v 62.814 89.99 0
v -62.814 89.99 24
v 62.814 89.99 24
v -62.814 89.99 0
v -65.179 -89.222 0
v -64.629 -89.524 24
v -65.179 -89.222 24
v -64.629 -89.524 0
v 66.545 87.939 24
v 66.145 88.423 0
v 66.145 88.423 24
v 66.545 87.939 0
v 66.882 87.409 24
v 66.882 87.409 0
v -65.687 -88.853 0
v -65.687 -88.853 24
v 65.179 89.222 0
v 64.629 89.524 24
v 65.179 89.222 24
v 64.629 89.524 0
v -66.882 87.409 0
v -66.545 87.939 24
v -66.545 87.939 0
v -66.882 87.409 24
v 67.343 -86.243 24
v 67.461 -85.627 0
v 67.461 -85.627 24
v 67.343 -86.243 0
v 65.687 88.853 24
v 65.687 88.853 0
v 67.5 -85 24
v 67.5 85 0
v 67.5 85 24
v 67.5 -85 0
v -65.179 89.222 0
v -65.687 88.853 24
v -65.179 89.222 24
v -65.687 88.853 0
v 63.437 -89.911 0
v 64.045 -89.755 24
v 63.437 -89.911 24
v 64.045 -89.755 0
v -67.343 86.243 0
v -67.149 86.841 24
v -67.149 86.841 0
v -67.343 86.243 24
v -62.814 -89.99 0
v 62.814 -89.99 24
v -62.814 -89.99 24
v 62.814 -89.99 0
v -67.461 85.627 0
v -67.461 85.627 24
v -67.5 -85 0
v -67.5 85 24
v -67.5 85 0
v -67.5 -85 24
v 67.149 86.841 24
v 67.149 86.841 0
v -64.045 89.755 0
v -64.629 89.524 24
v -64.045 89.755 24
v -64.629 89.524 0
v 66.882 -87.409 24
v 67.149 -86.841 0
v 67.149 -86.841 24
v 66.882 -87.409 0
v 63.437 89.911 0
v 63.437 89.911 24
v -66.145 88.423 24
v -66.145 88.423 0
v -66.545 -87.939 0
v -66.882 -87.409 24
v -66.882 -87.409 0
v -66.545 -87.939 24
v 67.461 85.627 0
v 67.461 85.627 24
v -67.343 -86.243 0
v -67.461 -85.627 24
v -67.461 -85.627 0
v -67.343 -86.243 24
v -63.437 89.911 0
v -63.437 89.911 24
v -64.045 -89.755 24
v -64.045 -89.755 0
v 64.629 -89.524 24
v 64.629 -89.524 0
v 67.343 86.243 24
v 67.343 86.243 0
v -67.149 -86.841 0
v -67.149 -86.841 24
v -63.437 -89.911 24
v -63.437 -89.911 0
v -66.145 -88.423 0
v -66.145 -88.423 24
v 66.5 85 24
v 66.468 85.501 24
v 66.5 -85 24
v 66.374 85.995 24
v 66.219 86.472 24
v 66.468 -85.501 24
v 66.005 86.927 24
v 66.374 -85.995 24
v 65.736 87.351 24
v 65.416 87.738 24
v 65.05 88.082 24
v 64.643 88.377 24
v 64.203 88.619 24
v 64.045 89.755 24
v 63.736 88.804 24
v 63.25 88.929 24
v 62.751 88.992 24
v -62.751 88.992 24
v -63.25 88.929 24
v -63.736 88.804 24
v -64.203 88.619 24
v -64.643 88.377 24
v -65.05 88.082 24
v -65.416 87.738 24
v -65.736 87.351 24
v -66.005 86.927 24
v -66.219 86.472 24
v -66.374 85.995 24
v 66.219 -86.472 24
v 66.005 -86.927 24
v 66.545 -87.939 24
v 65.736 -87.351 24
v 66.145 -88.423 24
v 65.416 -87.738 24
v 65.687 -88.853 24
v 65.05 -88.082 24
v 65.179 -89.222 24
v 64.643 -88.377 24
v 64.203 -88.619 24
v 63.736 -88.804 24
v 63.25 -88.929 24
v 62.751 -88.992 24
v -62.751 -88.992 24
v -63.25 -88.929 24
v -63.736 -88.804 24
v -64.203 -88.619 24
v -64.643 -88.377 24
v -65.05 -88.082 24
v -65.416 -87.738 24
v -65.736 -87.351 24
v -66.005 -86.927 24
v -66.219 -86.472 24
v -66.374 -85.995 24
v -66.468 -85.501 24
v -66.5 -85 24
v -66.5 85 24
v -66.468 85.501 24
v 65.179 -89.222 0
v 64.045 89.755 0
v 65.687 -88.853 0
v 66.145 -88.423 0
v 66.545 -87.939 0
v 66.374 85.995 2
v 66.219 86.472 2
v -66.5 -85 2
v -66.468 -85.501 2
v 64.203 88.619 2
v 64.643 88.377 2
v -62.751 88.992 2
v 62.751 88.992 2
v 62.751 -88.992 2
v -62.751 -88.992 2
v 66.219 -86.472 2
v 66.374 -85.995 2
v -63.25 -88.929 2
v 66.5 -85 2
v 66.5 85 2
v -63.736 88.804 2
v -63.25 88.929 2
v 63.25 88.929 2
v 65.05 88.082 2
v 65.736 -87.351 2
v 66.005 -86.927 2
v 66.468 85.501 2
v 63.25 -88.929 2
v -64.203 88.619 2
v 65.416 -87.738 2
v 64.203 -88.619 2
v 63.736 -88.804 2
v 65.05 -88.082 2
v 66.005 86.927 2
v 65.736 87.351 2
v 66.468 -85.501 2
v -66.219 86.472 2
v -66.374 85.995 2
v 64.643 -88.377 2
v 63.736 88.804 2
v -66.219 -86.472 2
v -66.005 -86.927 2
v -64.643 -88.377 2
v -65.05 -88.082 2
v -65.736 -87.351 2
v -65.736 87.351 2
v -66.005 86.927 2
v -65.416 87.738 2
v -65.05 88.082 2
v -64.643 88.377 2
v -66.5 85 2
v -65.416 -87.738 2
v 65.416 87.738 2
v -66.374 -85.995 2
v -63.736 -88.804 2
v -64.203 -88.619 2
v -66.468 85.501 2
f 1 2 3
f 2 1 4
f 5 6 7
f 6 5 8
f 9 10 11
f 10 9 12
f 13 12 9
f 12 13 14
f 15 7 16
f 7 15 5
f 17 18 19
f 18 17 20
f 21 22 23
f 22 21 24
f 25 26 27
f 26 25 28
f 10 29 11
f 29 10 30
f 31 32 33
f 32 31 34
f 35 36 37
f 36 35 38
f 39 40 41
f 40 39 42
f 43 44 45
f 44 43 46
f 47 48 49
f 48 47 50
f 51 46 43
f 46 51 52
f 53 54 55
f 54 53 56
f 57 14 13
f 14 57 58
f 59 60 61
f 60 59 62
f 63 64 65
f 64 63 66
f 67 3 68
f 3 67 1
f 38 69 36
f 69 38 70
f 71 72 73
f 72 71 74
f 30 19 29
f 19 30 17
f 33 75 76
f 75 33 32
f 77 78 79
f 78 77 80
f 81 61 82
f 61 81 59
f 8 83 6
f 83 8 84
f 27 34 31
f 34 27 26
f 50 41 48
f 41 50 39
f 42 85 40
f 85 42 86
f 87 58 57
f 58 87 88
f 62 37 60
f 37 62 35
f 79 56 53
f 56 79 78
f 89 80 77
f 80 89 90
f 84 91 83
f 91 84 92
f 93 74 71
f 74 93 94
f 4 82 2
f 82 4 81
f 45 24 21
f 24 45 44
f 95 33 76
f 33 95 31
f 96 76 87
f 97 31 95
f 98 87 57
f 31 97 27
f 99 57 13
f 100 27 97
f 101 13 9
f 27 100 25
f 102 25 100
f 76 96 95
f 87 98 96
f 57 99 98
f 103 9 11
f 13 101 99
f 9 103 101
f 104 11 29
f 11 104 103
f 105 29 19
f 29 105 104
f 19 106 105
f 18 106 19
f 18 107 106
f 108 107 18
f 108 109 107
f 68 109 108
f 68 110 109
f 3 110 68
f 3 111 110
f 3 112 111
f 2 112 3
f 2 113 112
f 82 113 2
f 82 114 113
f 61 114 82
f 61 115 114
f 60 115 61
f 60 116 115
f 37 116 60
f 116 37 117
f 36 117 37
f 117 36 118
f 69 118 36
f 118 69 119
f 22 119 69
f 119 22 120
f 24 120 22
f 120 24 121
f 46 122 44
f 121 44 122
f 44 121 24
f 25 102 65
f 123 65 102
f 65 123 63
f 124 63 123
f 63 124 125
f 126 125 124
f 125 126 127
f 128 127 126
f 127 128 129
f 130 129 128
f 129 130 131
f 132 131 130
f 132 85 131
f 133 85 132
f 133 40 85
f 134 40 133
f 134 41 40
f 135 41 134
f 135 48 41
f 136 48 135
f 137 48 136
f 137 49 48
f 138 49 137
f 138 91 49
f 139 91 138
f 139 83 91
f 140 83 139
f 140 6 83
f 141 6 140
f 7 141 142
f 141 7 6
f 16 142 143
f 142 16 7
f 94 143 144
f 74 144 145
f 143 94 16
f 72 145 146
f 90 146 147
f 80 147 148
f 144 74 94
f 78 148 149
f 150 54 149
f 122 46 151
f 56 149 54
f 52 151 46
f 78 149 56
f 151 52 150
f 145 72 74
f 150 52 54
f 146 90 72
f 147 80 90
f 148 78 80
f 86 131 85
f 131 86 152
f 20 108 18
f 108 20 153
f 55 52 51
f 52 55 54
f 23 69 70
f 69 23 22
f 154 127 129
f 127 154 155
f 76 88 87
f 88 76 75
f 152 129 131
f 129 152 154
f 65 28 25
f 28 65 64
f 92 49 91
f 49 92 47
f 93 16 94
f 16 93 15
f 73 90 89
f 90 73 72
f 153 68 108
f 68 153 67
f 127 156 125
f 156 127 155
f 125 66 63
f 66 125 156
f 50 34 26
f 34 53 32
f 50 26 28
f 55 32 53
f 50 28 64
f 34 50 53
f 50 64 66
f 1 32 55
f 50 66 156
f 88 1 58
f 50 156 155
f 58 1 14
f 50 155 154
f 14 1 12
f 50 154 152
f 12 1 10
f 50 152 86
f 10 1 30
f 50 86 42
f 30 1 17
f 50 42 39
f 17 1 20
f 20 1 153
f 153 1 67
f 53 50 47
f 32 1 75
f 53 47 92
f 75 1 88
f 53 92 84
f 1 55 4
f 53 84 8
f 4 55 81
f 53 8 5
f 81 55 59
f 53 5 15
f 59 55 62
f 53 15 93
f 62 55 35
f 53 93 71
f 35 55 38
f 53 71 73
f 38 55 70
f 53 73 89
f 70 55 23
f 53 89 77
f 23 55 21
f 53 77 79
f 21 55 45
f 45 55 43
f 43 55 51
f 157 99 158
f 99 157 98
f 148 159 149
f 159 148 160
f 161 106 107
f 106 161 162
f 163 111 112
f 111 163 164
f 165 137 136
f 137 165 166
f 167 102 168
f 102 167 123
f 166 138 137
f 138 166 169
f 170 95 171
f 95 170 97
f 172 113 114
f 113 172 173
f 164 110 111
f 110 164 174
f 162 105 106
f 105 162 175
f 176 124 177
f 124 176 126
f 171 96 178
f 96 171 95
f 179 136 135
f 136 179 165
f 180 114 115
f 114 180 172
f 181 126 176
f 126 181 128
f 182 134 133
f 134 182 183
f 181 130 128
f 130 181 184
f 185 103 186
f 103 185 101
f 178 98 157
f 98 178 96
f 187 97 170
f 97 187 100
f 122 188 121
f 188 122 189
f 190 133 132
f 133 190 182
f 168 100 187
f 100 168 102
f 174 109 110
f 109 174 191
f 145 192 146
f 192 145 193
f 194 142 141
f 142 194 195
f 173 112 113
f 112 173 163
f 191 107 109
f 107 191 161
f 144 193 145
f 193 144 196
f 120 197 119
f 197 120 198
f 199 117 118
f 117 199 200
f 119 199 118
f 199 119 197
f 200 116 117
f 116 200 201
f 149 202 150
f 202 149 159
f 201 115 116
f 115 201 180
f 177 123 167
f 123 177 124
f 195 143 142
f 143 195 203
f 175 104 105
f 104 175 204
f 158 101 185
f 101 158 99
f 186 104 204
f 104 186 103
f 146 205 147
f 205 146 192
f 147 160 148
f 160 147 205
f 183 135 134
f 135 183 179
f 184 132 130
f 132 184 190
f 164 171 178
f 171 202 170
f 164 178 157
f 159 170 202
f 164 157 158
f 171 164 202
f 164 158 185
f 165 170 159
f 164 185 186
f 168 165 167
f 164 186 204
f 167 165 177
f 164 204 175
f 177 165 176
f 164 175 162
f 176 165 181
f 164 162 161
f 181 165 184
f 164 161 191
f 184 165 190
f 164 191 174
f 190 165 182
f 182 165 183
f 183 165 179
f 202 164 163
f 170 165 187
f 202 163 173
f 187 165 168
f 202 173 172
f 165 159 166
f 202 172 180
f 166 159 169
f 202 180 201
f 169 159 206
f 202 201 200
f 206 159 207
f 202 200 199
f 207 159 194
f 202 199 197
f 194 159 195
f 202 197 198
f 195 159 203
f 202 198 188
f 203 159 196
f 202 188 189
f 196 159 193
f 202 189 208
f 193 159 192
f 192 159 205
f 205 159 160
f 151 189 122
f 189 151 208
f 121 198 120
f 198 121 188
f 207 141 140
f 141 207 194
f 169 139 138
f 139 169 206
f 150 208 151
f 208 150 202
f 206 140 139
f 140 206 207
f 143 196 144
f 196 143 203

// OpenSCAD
$fn = 50;


difference() {
	union() {
		hull() {
			translate(v = [-62.5000000000, 85.0000000000, 0]) {
				cylinder(h = 24, r = 5);
			}
			translate(v = [62.5000000000, 85.0000000000, 0]) {
				cylinder(h = 24, r = 5);
			}
			translate(v = [-62.5000000000, -85.0000000000, 0]) {
				cylinder(h = 24, r = 5);
			}
			translate(v = [62.5000000000, -85.0000000000, 0]) {
				cylinder(h = 24, r = 5);
			}
		}
	}
	union() {
		translate(v = [0, 0, 2]) {
			hull() {
				translate(v = [-62.5000000000, 85.0000000000, 0]) {
					cylinder(h = 22, r = 4);
				}
				translate(v = [62.5000000000, 85.0000000000, 0]) {
					cylinder(h = 22, r = 4);
				}
				translate(v = [-62.5000000000, -85.0000000000, 0]) {
					cylinder(h = 22, r = 4);
				}
				translate(v = [62.5000000000, -85.0000000000, 0]) {
					cylinder(h = 22, r = 4);
				}
			}
		}
	}
}
